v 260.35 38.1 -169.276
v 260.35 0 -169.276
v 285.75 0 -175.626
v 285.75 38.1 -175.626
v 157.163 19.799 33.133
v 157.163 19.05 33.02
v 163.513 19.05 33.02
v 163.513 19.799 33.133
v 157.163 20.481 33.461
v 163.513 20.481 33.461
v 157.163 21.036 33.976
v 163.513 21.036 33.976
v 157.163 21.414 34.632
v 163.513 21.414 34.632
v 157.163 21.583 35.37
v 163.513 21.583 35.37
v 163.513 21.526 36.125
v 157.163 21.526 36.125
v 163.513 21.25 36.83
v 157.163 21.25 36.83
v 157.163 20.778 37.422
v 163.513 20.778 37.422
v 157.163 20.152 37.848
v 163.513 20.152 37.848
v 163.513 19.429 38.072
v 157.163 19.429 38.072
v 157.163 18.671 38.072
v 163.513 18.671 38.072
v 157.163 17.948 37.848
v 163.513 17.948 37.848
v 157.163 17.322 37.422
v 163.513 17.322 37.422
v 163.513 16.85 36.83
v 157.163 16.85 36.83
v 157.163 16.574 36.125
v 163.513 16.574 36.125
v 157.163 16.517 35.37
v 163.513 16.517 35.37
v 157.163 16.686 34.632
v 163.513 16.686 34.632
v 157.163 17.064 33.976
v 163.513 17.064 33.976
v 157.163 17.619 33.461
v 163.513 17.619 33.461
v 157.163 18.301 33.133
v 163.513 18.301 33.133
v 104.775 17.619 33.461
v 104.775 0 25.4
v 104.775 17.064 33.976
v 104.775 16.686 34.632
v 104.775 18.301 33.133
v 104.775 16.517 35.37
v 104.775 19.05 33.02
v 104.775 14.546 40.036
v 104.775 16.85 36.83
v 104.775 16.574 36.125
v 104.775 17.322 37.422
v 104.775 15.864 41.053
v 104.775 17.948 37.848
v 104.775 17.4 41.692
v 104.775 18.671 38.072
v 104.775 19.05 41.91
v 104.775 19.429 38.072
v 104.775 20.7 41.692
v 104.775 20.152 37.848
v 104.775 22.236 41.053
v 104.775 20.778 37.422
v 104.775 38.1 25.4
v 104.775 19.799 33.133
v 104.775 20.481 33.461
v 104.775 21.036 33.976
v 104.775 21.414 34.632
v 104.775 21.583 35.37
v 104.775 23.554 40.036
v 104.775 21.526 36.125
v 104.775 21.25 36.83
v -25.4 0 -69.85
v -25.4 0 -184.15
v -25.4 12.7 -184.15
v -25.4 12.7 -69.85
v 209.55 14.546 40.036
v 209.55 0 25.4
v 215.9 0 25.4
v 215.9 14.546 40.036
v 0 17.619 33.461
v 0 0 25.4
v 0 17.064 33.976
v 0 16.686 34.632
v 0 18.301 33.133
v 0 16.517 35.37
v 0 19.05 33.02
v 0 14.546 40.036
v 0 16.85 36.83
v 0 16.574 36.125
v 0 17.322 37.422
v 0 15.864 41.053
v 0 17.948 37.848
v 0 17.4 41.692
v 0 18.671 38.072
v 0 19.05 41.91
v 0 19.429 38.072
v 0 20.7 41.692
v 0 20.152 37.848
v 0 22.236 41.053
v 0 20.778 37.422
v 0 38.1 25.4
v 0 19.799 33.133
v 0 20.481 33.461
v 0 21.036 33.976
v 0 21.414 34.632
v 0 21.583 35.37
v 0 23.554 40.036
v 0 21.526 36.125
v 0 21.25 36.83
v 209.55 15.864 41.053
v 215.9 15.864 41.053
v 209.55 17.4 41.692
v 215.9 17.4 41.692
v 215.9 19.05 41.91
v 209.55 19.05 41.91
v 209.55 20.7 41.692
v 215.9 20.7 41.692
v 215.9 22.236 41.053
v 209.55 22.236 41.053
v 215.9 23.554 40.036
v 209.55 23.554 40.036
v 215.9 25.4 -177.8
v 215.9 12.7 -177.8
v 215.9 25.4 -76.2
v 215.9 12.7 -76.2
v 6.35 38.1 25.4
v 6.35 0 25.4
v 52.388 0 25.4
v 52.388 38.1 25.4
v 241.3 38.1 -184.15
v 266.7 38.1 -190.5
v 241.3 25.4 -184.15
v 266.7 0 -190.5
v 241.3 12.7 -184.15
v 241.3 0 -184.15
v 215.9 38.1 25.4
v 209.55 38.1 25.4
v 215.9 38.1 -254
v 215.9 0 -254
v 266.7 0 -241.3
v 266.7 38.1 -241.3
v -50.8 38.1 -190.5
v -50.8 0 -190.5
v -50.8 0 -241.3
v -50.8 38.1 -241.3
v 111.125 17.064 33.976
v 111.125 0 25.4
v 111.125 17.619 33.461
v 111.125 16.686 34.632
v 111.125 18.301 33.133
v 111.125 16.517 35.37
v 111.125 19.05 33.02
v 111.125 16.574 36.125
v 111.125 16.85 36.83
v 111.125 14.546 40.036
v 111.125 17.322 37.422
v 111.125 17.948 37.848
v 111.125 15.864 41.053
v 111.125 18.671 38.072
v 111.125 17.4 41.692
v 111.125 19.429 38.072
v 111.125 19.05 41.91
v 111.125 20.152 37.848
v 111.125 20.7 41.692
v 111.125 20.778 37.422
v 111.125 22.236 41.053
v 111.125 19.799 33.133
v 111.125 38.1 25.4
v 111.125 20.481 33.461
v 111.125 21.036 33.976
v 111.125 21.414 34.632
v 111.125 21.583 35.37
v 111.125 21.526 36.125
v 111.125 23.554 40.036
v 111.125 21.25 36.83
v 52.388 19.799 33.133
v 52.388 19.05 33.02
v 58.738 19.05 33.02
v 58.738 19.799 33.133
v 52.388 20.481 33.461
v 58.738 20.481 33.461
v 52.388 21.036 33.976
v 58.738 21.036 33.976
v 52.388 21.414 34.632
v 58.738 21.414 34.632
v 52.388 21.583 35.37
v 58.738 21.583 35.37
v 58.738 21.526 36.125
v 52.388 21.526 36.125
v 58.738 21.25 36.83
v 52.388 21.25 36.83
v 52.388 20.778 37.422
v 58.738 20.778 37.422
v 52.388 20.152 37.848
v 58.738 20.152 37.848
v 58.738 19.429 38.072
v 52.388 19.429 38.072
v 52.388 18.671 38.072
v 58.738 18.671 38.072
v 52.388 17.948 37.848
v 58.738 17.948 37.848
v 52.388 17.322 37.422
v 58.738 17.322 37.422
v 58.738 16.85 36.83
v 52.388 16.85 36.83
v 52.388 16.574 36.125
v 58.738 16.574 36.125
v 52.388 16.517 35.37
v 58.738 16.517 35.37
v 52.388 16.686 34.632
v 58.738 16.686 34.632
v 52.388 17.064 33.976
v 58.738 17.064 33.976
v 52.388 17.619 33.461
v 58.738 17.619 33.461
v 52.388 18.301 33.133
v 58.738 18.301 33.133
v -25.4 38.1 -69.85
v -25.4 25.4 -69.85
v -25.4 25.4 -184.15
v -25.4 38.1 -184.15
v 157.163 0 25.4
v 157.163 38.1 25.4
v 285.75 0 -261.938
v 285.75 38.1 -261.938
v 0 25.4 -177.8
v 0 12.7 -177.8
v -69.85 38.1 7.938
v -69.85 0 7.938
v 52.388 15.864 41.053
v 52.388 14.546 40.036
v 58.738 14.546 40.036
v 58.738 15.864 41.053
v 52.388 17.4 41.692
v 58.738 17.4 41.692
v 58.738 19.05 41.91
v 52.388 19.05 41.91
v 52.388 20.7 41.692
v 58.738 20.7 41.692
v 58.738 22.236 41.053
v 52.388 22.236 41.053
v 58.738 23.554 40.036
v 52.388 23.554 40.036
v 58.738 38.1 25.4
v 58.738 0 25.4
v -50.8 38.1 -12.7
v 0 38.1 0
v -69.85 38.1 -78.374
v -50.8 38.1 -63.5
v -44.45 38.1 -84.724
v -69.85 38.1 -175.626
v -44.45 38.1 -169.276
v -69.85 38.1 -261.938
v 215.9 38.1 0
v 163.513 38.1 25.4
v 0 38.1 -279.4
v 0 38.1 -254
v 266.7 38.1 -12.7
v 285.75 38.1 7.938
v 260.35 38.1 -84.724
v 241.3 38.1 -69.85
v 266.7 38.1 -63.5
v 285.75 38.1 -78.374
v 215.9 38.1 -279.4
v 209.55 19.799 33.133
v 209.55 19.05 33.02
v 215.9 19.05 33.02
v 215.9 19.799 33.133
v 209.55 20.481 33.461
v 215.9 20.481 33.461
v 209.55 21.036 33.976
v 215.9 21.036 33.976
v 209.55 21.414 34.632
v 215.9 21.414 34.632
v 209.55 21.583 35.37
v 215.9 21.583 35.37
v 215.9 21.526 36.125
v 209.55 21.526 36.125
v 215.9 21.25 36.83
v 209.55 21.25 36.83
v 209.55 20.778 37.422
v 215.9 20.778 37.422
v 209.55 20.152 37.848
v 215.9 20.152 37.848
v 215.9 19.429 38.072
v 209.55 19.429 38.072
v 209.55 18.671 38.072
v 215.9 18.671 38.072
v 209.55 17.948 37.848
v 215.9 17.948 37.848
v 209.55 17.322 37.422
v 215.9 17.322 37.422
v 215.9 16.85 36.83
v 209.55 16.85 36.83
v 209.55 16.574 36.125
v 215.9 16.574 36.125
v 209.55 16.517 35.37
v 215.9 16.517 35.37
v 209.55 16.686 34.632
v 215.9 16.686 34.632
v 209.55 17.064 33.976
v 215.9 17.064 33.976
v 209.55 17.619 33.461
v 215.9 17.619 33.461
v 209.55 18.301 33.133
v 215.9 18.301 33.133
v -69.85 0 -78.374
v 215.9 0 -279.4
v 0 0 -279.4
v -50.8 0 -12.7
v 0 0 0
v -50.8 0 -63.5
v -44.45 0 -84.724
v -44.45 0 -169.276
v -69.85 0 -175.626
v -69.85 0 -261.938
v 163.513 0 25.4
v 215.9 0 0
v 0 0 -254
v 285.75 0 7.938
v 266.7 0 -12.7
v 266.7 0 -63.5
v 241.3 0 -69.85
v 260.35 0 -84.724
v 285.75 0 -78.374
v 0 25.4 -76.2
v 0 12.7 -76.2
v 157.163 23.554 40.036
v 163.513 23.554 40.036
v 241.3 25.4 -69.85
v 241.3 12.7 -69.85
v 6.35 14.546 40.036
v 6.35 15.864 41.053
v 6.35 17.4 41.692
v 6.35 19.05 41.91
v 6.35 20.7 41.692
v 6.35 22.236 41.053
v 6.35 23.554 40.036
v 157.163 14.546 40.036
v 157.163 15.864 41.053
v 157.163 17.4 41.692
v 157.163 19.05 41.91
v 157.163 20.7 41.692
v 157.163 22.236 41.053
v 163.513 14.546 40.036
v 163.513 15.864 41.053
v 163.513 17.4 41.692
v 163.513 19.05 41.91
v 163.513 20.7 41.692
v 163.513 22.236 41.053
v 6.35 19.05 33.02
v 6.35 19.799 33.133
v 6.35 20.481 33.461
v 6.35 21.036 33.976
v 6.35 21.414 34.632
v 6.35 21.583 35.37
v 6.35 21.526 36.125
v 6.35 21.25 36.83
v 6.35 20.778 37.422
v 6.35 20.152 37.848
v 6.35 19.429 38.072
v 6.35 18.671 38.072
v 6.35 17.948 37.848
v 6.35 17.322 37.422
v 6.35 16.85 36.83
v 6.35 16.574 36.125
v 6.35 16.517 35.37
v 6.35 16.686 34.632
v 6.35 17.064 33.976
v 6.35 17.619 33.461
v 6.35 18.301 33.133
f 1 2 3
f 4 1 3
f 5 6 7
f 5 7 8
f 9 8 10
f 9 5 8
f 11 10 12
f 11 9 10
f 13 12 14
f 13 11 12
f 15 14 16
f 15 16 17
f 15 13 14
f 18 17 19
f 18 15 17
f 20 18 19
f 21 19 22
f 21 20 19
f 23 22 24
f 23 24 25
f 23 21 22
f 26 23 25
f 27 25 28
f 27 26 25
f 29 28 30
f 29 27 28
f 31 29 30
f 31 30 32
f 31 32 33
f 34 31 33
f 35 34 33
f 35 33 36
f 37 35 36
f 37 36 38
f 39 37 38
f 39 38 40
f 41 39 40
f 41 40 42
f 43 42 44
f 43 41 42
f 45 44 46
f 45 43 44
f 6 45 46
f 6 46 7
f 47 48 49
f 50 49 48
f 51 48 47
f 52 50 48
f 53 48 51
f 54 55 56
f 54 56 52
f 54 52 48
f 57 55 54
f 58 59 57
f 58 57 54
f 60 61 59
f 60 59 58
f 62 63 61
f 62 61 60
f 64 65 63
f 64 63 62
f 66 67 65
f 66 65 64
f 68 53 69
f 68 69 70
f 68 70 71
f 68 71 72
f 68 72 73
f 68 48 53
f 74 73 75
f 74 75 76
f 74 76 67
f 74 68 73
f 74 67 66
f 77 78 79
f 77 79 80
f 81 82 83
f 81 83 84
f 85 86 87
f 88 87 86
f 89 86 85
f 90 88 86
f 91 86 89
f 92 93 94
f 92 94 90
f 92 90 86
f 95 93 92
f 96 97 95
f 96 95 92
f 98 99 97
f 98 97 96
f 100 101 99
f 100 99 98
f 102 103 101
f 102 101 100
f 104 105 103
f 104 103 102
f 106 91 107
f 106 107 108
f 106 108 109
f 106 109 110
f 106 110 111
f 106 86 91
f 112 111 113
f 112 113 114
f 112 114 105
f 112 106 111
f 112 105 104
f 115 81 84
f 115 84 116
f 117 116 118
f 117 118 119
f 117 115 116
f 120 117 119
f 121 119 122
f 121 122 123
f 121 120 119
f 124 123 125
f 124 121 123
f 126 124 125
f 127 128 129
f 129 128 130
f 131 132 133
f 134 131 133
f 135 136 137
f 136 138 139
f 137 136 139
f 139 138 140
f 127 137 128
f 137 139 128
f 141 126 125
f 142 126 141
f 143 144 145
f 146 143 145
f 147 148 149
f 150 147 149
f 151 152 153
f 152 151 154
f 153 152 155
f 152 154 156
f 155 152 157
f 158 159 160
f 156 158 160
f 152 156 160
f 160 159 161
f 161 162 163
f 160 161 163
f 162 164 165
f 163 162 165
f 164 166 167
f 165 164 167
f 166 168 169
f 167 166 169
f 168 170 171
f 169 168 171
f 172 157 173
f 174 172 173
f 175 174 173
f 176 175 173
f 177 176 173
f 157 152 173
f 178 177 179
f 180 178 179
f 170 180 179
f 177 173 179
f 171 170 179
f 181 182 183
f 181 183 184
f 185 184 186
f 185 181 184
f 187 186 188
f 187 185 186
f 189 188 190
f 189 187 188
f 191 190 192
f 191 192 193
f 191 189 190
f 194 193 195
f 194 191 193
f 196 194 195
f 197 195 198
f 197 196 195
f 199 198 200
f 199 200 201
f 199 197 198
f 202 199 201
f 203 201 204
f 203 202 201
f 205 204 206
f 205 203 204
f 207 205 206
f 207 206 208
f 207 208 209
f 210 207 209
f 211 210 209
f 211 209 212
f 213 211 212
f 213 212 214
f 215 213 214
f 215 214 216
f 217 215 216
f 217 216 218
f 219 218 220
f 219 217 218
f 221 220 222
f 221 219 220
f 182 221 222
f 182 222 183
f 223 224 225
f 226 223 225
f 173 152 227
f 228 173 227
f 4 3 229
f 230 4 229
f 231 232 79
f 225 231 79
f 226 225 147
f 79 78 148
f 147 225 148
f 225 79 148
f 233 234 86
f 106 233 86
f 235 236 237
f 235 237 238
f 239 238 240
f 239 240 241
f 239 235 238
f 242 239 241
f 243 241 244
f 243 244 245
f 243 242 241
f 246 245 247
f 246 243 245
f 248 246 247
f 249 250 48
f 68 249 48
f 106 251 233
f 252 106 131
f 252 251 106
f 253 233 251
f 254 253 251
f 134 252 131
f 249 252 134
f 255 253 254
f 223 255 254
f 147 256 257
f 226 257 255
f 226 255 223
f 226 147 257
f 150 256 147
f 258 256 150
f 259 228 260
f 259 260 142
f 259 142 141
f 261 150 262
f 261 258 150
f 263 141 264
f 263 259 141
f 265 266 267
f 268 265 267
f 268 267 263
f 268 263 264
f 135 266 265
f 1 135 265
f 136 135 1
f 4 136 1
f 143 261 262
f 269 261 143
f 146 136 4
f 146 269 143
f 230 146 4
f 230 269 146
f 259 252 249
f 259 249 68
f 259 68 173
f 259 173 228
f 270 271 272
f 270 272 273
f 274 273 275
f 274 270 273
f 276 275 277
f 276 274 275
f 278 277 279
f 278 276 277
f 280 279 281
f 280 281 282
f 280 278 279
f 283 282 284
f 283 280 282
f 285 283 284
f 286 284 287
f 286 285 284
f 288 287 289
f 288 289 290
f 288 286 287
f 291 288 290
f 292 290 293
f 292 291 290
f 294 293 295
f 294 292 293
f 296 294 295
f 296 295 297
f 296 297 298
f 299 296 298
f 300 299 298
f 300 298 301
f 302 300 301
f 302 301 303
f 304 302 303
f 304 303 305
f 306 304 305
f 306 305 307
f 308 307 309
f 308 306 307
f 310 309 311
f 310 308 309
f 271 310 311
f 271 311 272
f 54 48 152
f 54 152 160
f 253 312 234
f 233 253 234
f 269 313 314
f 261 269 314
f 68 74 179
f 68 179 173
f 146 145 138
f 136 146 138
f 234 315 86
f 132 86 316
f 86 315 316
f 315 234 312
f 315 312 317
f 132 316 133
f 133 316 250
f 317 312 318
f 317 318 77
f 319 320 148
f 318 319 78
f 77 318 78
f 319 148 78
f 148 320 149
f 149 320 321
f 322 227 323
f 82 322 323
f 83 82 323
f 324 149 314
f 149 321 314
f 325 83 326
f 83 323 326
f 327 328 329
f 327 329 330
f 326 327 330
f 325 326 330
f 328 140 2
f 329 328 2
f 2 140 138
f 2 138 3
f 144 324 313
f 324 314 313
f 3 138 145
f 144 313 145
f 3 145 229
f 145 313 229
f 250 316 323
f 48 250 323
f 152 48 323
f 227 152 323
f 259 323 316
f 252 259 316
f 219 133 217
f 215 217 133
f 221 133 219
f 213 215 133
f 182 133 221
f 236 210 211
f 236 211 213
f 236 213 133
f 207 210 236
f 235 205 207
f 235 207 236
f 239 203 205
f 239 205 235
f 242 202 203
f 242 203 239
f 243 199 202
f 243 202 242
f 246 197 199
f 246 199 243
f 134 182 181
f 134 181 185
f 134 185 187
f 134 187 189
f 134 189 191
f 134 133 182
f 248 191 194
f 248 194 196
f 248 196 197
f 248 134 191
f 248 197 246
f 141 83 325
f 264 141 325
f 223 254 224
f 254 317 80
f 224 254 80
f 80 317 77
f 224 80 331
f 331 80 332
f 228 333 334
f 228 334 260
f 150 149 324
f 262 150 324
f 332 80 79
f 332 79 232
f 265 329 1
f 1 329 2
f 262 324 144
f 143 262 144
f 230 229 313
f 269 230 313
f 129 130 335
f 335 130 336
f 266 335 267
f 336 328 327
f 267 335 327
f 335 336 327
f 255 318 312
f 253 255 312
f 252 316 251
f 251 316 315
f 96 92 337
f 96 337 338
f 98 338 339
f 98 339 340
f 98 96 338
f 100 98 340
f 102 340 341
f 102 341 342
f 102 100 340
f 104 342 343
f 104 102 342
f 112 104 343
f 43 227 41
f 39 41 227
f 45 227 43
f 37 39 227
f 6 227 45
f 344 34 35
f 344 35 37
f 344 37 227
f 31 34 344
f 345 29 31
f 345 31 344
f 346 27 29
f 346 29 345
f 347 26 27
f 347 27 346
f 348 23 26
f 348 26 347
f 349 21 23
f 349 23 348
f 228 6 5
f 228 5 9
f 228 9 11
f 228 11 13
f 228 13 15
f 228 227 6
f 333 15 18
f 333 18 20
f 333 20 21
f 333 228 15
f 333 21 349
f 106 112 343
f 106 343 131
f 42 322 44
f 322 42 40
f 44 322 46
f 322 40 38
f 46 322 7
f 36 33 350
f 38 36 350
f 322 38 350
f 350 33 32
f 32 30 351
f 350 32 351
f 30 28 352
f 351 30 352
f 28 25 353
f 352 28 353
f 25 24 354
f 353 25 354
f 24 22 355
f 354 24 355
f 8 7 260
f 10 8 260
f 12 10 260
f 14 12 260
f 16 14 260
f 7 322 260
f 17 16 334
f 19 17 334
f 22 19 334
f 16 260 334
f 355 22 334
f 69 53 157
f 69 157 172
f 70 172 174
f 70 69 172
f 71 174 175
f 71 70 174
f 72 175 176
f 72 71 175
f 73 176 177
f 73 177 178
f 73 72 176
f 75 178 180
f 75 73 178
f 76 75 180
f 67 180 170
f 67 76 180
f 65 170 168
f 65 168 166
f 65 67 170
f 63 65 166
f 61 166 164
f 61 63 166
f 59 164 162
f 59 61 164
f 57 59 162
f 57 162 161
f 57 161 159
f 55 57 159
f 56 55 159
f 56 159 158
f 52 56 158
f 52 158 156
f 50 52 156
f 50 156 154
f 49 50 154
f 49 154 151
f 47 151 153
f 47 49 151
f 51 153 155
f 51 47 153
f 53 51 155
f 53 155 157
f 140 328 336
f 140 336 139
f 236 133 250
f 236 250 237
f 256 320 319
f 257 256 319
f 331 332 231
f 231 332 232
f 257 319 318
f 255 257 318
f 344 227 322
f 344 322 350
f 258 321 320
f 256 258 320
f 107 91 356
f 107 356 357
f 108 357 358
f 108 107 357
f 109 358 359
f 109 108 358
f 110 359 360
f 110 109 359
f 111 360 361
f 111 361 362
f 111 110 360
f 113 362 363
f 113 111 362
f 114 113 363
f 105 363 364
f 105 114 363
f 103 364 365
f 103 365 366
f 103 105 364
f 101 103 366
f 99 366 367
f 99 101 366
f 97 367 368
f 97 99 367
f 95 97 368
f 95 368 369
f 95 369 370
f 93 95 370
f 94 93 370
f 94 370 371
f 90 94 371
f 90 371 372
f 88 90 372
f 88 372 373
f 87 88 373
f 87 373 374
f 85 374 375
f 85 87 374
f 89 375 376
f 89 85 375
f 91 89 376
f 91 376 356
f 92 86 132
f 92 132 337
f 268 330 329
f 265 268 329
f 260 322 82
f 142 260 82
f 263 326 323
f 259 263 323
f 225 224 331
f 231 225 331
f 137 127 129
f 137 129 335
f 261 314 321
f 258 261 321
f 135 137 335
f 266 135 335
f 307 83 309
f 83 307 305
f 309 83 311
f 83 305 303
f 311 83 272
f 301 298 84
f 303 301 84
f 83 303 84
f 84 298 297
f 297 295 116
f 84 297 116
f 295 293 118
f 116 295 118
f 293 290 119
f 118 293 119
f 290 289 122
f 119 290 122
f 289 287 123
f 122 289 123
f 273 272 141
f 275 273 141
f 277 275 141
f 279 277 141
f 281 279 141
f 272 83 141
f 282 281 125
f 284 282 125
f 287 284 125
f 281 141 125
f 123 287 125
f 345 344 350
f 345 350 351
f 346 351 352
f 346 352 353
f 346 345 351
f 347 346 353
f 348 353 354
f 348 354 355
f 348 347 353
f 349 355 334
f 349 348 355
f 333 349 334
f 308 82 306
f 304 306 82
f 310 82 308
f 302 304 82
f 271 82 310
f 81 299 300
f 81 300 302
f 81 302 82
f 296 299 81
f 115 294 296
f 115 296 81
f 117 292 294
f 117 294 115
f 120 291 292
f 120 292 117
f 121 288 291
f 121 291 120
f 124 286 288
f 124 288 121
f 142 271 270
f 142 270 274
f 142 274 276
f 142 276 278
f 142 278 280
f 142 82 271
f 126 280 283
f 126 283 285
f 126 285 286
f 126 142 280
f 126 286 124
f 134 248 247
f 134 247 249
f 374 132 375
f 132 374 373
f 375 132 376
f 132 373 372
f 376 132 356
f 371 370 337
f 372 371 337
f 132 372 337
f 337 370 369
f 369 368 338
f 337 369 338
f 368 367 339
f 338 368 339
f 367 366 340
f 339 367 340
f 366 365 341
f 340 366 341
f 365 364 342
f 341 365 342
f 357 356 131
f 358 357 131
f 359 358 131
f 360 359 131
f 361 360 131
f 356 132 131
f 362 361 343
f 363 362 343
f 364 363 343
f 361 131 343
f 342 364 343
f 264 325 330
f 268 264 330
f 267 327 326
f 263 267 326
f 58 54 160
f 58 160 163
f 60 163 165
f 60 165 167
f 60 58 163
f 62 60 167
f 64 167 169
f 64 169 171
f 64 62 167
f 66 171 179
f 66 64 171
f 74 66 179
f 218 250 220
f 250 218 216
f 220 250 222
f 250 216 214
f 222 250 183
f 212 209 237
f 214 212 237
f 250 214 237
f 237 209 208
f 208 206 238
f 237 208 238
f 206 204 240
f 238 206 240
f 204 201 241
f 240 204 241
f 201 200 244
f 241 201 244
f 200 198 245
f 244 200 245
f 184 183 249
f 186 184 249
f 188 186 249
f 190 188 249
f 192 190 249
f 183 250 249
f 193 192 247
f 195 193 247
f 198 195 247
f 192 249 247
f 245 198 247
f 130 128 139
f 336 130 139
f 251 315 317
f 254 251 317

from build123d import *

# Parameters (mm, degrees)
BOSS_EXTRUDE1_DEPTH = 38.1
SKETCH2_R           = 2.54
BOSS_EXTRUDE2_DEPTH = 6.35
LPATTERN1_COUNT     = 5
LPATTERN1_PITCH     = 52.3875
BOSS_EXTRUDE3_DEPTH = 25.4
CUT_EXTRUDE1_DEPTH  = 12.7


with BuildPart() as part:
    # Sketch1 → Boss-Extrude1 (new body)
    with BuildSketch(Plane(origin=(0, 0, 0), x_dir=(1, 0, 0), z_dir=(0, 1, 0))):
        Polygon((-69.85, 261.9375), (-69.85, 175.626209458), (-44.45, 169.276209458), (-44.45, 84.723790542), (-69.85, 78.373790542), (-69.85, -7.9375), (0, -25.4), (215.9, -25.4), (285.75, -7.9375), (285.75, 78.373790542), (260.35, 84.723790542), (260.35, 169.276209458), (285.75, 175.626209458), (285.75, 261.9375), (215.9, 279.4), (0, 279.4), align=None)
        Polygon((-25.4, 69.85), (-25.4, 184.15), (-50.8, 190.5), (-50.8, 241.3), (0, 254), (215.9, 254), (266.7, 241.3), (266.7, 190.5), (241.3, 184.15), (241.3, 69.85), (266.7, 63.5), (266.7, 12.7), (215.9, 0), (0, 0), (-50.8, 12.7), (-50.8, 63.5), align=None, mode=Mode.SUBTRACT)
    extrude(amount=BOSS_EXTRUDE1_DEPTH)

    # Sketch2 → Boss-Extrude2 (add)
    with BuildSketch(Plane(origin=(0, 0, 0), x_dir=(0, 0, -1), z_dir=(1, 0, 0))):
        with BuildLine():
            Line((-40.036226007, 23.553987204), (-25.4, 38.1))
            Line((-25.4, 38.1), (-25.4, 0))
            Line((-25.4, 0), (-40.036226007, 14.546012796))
            ThreePointArc((-40.036226007, 14.546012796), (-41.91, 19.05), (-40.036226007, 23.553987204))
        make_face()
        with Locations((-35.56, 19.05)):
            Circle(SKETCH2_R, mode=Mode.SUBTRACT)
    boss_extrude2 = extrude(amount=BOSS_EXTRUDE2_DEPTH)

    # LPattern1: Boss-Extrude2 ×5
    with Locations(*[(i * LPATTERN1_PITCH, 0, 0) for i in range(1, LPATTERN1_COUNT)]):
        add(boss_extrude2)

    # Sketch1<3> → Boss-Extrude3 (add)
    with BuildSketch(Plane(origin=(0, 0, 0), x_dir=(1, 0, 0), z_dir=(0, 1, 0))):
        Polygon((0, 76.2), (0, 177.8), (-25.4, 184.15), (-25.4, 69.85), align=None)
        Polygon((241.3, 69.85), (241.3, 184.15), (215.9, 177.8), (215.9, 76.2), align=None)
    extrude(amount=BOSS_EXTRUDE3_DEPTH)

    # Sketch1<4> → Cut-Extrude1 (cut)
    with BuildSketch(Plane(origin=(0, 0, 0), x_dir=(1, 0, 0), z_dir=(0, 1, 0))):
        Polygon((0, 76.2), (0, 177.8), (-25.4, 184.15), (-25.4, 69.85), align=None)
        Polygon((241.3, 69.85), (241.3, 184.15), (215.9, 177.8), (215.9, 76.2), align=None)
    extrude(amount=CUT_EXTRUDE1_DEPTH, mode=Mode.SUBTRACT)


solid = part.part
